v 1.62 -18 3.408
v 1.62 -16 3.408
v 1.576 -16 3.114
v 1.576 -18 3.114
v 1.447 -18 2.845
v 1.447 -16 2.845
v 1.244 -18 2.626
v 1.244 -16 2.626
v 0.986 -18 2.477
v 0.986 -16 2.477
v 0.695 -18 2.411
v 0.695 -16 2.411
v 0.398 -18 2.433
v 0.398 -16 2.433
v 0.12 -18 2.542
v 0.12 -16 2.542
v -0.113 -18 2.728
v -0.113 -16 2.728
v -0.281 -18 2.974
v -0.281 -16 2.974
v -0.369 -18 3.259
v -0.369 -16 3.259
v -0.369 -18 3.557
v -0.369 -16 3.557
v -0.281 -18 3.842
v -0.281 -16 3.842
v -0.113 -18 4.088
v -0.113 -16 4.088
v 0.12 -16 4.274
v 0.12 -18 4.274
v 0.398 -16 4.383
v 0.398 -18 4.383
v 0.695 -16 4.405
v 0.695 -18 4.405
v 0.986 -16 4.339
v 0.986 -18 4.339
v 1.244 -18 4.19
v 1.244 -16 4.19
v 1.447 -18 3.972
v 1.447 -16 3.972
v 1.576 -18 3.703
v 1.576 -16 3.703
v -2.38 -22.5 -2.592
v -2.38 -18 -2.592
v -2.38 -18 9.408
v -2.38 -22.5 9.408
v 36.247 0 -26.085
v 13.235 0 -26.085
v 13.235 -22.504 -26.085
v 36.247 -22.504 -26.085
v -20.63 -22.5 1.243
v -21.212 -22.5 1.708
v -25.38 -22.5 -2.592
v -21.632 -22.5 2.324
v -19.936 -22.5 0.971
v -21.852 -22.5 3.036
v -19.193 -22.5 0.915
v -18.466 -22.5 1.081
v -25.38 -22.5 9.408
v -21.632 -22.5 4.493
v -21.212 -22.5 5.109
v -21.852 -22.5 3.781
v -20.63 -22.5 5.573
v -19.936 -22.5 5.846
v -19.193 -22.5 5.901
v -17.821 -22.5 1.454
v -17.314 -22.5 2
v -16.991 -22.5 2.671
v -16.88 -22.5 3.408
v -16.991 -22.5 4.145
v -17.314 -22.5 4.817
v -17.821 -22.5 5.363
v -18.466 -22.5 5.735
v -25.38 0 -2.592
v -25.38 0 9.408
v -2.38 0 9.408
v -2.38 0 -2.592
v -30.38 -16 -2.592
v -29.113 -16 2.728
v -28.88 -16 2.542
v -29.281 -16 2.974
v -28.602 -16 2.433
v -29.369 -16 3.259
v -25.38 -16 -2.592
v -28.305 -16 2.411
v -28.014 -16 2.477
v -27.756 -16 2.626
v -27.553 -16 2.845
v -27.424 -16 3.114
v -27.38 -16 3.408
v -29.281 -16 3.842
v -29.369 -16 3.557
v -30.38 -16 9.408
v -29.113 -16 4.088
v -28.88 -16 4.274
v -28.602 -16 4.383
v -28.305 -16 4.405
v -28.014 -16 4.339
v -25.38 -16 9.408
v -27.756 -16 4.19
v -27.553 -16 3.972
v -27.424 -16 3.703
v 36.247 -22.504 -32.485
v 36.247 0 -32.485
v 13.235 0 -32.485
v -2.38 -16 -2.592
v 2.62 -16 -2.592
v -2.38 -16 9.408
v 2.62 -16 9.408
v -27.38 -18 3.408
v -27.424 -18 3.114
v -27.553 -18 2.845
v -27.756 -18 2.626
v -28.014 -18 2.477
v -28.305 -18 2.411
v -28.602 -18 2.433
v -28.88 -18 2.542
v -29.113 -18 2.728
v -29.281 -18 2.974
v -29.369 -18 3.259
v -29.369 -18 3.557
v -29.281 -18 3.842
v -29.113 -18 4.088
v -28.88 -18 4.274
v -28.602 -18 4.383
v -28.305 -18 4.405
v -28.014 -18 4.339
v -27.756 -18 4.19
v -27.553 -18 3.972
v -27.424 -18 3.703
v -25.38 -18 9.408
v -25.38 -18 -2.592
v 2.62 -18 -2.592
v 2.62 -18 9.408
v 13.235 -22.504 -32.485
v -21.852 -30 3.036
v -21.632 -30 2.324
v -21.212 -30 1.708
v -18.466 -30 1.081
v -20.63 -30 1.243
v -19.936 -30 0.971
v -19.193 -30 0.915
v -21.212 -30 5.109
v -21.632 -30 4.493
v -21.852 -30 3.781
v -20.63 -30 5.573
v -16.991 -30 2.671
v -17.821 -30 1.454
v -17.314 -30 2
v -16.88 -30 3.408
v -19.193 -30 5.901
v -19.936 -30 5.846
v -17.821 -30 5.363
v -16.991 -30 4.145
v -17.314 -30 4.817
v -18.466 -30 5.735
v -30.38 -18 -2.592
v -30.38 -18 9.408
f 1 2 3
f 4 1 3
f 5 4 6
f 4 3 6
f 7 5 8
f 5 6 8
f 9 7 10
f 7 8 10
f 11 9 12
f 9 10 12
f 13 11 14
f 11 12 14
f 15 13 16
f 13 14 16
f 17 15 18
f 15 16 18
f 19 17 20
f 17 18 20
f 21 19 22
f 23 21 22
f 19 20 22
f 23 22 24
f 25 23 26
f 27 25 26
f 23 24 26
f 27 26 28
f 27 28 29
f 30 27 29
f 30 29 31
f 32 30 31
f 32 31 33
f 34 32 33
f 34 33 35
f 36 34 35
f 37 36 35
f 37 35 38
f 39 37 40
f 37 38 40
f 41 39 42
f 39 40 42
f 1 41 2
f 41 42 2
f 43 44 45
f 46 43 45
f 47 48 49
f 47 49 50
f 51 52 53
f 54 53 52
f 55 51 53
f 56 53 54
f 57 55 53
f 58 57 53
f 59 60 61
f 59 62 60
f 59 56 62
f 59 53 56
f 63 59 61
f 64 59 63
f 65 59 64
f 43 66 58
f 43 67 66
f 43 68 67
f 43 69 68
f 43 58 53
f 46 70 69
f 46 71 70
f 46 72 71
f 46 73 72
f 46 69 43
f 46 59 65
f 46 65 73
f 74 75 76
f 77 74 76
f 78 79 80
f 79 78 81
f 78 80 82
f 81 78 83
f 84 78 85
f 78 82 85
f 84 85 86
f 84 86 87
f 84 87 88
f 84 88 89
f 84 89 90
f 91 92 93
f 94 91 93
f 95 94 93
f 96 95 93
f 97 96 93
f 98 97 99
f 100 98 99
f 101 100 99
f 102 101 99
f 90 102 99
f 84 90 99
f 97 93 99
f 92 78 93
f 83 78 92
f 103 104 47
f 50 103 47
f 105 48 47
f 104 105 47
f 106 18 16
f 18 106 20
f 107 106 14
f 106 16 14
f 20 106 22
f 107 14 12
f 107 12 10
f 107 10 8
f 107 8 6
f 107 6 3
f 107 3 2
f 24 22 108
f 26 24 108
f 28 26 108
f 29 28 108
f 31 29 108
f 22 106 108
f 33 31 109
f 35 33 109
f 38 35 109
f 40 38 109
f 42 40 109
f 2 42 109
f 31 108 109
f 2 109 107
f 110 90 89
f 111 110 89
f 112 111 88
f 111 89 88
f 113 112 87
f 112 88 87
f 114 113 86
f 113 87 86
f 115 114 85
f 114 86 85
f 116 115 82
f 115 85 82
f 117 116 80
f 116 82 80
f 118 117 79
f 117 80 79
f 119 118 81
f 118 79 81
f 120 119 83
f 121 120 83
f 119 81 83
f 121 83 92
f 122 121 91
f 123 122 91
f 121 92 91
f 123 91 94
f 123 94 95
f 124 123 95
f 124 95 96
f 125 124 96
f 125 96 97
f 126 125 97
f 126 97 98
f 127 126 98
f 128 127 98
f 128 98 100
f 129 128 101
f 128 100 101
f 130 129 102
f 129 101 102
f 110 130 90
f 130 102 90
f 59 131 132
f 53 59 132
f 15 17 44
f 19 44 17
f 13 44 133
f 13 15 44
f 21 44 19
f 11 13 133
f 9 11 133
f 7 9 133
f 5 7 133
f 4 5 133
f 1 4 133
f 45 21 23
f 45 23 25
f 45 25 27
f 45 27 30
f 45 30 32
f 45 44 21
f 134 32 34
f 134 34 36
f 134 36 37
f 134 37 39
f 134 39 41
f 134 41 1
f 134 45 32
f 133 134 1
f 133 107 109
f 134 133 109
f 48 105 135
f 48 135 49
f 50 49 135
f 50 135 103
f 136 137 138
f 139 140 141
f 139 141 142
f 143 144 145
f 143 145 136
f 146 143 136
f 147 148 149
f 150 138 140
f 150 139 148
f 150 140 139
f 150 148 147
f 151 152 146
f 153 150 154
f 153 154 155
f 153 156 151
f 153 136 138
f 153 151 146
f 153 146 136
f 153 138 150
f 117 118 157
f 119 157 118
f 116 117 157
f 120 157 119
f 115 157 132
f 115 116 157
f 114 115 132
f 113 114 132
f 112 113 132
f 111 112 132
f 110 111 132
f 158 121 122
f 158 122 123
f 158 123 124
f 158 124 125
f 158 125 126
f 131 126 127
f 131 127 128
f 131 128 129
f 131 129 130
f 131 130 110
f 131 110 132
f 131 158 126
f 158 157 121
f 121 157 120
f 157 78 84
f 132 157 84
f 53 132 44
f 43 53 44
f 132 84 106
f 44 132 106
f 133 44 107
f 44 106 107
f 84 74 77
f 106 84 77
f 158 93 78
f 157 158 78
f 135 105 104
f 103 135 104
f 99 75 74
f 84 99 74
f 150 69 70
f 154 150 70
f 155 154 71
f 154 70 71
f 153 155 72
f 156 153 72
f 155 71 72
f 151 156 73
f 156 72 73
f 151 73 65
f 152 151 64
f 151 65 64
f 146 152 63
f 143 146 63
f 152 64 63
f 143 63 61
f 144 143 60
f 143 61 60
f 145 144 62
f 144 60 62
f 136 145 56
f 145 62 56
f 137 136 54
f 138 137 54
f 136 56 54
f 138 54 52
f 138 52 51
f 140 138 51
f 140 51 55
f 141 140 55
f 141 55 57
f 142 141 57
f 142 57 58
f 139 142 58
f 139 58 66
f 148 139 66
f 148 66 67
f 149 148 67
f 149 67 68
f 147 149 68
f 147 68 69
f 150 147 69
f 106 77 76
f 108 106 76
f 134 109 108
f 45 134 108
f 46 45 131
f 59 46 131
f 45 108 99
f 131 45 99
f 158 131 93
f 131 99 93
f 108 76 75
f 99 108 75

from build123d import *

# Parameters (mm, degrees)
F0_R     = 2.5
F1_DEPTH = 30
F2_DEPTH = 22.5
F3_START = 16
F3_DEPTH = 2
F0_W     = 23.0124
F0_H     = 6.4
F4_DEPTH = 22.5044


with BuildPart() as f1:
    # F0 (on Front) → F1 (new body)
    with BuildSketch(Plane.XZ):
        with Locations((-19.3797349334, 3.4082894735)):
            Circle(F0_R)
    extrude(amount=F1_DEPTH)

    # F0 (on Front) → F2 (join)
    with BuildSketch(Plane.XZ):
        Polygon((-2.3797349334, 9.4082894735), (-25.3797349334, 9.4082894735), (-25.3797349334, 3.4082894735), (-25.3797349334, -2.5917105265), (-2.3797349334, -2.5917105265), (-2.3797349334, 3.4082894735), align=None)
        with Locations((-19.3797349334, 3.4082894735)):
            Circle(F0_R, mode=Mode.SUBTRACT)
    extrude(amount=F2_DEPTH)

    # F0 (on Front) → F3 (join)
    with BuildSketch(Plane.XZ.offset(F3_START)):
        with BuildLine():
            Line((2.6202650666, 9.4082894735), (-2.3797349334, 9.4082894735))
            Line((-2.3797349334, 9.4082894735), (-2.3797349334, 3.4082894735))
            Line((-2.3797349334, 3.4082894735), (-0.3797349334, 3.4082894735))
            ThreePointArc((-0.3797349334, 3.4082894735), (0.6202650666, 4.4082894735), (1.6202650666, 3.4082894735))
            Line((1.6202650666, 3.4082894735), (2.6202650666, 3.4082894735))
            Line((2.6202650666, 3.4082894735), (2.6202650666, 9.4082894735))
        make_face()
        with BuildLine():
            Line((-25.3797349334, 3.4082894735), (-25.3797349334, 9.4082894735))
            Line((-25.3797349334, 9.4082894735), (-30.3797349334, 9.4082894735))
            Line((-30.3797349334, 9.4082894735), (-30.3797349334, 3.4082894735))
            Line((-30.3797349334, 3.4082894735), (-29.3797349334, 3.4082894735))
            ThreePointArc((-29.3797349334, 3.4082894735), (-28.3797349334, 4.4082894735), (-27.3797349334, 3.4082894735))
            Line((-27.3797349334, 3.4082894735), (-25.3797349334, 3.4082894735))
        make_face()
        with BuildLine():
            Line((-25.3797349334, -2.5917105265), (-25.3797349334, 3.4082894735))
            Line((-25.3797349334, 3.4082894735), (-27.3797349334, 3.4082894735))
            ThreePointArc((-27.3797349334, 3.4082894735), (-28.3797349334, 2.4082894735), (-29.3797349334, 3.4082894735))
            Line((-29.3797349334, 3.4082894735), (-30.3797349334, 3.4082894735))
            Line((-30.3797349334, 3.4082894735), (-30.3797349334, -2.5917105265))
            Line((-30.3797349334, -2.5917105265), (-25.3797349334, -2.5917105265))
        make_face()
        with BuildLine():
            Line((-0.3797349334, 3.4082894735), (-2.3797349334, 3.4082894735))
            Line((-2.3797349334, 3.4082894735), (-2.3797349334, -2.5917105265))
            Line((-2.3797349334, -2.5917105265), (2.6202650666, -2.5917105265))
            Line((2.6202650666, -2.5917105265), (2.6202650666, 3.4082894735))
            Line((2.6202650666, 3.4082894735), (1.6202650666, 3.4082894735))
            ThreePointArc((1.6202650666, 3.4082894735), (0.6202650666, 2.4082894735), (-0.3797349334, 3.4082894735))
        make_face()
    extrude(amount=F3_DEPTH)


with BuildPart() as f4:
    # F0 (on Front) → F4 (new body)
    with BuildSketch(Plane.XZ):
        with Locations((24.7409354665, -29.2852652848)):
            Rectangle(F0_W, F0_H)
    extrude(amount=F4_DEPTH)


solid = Compound([f1.part, f4.part])
